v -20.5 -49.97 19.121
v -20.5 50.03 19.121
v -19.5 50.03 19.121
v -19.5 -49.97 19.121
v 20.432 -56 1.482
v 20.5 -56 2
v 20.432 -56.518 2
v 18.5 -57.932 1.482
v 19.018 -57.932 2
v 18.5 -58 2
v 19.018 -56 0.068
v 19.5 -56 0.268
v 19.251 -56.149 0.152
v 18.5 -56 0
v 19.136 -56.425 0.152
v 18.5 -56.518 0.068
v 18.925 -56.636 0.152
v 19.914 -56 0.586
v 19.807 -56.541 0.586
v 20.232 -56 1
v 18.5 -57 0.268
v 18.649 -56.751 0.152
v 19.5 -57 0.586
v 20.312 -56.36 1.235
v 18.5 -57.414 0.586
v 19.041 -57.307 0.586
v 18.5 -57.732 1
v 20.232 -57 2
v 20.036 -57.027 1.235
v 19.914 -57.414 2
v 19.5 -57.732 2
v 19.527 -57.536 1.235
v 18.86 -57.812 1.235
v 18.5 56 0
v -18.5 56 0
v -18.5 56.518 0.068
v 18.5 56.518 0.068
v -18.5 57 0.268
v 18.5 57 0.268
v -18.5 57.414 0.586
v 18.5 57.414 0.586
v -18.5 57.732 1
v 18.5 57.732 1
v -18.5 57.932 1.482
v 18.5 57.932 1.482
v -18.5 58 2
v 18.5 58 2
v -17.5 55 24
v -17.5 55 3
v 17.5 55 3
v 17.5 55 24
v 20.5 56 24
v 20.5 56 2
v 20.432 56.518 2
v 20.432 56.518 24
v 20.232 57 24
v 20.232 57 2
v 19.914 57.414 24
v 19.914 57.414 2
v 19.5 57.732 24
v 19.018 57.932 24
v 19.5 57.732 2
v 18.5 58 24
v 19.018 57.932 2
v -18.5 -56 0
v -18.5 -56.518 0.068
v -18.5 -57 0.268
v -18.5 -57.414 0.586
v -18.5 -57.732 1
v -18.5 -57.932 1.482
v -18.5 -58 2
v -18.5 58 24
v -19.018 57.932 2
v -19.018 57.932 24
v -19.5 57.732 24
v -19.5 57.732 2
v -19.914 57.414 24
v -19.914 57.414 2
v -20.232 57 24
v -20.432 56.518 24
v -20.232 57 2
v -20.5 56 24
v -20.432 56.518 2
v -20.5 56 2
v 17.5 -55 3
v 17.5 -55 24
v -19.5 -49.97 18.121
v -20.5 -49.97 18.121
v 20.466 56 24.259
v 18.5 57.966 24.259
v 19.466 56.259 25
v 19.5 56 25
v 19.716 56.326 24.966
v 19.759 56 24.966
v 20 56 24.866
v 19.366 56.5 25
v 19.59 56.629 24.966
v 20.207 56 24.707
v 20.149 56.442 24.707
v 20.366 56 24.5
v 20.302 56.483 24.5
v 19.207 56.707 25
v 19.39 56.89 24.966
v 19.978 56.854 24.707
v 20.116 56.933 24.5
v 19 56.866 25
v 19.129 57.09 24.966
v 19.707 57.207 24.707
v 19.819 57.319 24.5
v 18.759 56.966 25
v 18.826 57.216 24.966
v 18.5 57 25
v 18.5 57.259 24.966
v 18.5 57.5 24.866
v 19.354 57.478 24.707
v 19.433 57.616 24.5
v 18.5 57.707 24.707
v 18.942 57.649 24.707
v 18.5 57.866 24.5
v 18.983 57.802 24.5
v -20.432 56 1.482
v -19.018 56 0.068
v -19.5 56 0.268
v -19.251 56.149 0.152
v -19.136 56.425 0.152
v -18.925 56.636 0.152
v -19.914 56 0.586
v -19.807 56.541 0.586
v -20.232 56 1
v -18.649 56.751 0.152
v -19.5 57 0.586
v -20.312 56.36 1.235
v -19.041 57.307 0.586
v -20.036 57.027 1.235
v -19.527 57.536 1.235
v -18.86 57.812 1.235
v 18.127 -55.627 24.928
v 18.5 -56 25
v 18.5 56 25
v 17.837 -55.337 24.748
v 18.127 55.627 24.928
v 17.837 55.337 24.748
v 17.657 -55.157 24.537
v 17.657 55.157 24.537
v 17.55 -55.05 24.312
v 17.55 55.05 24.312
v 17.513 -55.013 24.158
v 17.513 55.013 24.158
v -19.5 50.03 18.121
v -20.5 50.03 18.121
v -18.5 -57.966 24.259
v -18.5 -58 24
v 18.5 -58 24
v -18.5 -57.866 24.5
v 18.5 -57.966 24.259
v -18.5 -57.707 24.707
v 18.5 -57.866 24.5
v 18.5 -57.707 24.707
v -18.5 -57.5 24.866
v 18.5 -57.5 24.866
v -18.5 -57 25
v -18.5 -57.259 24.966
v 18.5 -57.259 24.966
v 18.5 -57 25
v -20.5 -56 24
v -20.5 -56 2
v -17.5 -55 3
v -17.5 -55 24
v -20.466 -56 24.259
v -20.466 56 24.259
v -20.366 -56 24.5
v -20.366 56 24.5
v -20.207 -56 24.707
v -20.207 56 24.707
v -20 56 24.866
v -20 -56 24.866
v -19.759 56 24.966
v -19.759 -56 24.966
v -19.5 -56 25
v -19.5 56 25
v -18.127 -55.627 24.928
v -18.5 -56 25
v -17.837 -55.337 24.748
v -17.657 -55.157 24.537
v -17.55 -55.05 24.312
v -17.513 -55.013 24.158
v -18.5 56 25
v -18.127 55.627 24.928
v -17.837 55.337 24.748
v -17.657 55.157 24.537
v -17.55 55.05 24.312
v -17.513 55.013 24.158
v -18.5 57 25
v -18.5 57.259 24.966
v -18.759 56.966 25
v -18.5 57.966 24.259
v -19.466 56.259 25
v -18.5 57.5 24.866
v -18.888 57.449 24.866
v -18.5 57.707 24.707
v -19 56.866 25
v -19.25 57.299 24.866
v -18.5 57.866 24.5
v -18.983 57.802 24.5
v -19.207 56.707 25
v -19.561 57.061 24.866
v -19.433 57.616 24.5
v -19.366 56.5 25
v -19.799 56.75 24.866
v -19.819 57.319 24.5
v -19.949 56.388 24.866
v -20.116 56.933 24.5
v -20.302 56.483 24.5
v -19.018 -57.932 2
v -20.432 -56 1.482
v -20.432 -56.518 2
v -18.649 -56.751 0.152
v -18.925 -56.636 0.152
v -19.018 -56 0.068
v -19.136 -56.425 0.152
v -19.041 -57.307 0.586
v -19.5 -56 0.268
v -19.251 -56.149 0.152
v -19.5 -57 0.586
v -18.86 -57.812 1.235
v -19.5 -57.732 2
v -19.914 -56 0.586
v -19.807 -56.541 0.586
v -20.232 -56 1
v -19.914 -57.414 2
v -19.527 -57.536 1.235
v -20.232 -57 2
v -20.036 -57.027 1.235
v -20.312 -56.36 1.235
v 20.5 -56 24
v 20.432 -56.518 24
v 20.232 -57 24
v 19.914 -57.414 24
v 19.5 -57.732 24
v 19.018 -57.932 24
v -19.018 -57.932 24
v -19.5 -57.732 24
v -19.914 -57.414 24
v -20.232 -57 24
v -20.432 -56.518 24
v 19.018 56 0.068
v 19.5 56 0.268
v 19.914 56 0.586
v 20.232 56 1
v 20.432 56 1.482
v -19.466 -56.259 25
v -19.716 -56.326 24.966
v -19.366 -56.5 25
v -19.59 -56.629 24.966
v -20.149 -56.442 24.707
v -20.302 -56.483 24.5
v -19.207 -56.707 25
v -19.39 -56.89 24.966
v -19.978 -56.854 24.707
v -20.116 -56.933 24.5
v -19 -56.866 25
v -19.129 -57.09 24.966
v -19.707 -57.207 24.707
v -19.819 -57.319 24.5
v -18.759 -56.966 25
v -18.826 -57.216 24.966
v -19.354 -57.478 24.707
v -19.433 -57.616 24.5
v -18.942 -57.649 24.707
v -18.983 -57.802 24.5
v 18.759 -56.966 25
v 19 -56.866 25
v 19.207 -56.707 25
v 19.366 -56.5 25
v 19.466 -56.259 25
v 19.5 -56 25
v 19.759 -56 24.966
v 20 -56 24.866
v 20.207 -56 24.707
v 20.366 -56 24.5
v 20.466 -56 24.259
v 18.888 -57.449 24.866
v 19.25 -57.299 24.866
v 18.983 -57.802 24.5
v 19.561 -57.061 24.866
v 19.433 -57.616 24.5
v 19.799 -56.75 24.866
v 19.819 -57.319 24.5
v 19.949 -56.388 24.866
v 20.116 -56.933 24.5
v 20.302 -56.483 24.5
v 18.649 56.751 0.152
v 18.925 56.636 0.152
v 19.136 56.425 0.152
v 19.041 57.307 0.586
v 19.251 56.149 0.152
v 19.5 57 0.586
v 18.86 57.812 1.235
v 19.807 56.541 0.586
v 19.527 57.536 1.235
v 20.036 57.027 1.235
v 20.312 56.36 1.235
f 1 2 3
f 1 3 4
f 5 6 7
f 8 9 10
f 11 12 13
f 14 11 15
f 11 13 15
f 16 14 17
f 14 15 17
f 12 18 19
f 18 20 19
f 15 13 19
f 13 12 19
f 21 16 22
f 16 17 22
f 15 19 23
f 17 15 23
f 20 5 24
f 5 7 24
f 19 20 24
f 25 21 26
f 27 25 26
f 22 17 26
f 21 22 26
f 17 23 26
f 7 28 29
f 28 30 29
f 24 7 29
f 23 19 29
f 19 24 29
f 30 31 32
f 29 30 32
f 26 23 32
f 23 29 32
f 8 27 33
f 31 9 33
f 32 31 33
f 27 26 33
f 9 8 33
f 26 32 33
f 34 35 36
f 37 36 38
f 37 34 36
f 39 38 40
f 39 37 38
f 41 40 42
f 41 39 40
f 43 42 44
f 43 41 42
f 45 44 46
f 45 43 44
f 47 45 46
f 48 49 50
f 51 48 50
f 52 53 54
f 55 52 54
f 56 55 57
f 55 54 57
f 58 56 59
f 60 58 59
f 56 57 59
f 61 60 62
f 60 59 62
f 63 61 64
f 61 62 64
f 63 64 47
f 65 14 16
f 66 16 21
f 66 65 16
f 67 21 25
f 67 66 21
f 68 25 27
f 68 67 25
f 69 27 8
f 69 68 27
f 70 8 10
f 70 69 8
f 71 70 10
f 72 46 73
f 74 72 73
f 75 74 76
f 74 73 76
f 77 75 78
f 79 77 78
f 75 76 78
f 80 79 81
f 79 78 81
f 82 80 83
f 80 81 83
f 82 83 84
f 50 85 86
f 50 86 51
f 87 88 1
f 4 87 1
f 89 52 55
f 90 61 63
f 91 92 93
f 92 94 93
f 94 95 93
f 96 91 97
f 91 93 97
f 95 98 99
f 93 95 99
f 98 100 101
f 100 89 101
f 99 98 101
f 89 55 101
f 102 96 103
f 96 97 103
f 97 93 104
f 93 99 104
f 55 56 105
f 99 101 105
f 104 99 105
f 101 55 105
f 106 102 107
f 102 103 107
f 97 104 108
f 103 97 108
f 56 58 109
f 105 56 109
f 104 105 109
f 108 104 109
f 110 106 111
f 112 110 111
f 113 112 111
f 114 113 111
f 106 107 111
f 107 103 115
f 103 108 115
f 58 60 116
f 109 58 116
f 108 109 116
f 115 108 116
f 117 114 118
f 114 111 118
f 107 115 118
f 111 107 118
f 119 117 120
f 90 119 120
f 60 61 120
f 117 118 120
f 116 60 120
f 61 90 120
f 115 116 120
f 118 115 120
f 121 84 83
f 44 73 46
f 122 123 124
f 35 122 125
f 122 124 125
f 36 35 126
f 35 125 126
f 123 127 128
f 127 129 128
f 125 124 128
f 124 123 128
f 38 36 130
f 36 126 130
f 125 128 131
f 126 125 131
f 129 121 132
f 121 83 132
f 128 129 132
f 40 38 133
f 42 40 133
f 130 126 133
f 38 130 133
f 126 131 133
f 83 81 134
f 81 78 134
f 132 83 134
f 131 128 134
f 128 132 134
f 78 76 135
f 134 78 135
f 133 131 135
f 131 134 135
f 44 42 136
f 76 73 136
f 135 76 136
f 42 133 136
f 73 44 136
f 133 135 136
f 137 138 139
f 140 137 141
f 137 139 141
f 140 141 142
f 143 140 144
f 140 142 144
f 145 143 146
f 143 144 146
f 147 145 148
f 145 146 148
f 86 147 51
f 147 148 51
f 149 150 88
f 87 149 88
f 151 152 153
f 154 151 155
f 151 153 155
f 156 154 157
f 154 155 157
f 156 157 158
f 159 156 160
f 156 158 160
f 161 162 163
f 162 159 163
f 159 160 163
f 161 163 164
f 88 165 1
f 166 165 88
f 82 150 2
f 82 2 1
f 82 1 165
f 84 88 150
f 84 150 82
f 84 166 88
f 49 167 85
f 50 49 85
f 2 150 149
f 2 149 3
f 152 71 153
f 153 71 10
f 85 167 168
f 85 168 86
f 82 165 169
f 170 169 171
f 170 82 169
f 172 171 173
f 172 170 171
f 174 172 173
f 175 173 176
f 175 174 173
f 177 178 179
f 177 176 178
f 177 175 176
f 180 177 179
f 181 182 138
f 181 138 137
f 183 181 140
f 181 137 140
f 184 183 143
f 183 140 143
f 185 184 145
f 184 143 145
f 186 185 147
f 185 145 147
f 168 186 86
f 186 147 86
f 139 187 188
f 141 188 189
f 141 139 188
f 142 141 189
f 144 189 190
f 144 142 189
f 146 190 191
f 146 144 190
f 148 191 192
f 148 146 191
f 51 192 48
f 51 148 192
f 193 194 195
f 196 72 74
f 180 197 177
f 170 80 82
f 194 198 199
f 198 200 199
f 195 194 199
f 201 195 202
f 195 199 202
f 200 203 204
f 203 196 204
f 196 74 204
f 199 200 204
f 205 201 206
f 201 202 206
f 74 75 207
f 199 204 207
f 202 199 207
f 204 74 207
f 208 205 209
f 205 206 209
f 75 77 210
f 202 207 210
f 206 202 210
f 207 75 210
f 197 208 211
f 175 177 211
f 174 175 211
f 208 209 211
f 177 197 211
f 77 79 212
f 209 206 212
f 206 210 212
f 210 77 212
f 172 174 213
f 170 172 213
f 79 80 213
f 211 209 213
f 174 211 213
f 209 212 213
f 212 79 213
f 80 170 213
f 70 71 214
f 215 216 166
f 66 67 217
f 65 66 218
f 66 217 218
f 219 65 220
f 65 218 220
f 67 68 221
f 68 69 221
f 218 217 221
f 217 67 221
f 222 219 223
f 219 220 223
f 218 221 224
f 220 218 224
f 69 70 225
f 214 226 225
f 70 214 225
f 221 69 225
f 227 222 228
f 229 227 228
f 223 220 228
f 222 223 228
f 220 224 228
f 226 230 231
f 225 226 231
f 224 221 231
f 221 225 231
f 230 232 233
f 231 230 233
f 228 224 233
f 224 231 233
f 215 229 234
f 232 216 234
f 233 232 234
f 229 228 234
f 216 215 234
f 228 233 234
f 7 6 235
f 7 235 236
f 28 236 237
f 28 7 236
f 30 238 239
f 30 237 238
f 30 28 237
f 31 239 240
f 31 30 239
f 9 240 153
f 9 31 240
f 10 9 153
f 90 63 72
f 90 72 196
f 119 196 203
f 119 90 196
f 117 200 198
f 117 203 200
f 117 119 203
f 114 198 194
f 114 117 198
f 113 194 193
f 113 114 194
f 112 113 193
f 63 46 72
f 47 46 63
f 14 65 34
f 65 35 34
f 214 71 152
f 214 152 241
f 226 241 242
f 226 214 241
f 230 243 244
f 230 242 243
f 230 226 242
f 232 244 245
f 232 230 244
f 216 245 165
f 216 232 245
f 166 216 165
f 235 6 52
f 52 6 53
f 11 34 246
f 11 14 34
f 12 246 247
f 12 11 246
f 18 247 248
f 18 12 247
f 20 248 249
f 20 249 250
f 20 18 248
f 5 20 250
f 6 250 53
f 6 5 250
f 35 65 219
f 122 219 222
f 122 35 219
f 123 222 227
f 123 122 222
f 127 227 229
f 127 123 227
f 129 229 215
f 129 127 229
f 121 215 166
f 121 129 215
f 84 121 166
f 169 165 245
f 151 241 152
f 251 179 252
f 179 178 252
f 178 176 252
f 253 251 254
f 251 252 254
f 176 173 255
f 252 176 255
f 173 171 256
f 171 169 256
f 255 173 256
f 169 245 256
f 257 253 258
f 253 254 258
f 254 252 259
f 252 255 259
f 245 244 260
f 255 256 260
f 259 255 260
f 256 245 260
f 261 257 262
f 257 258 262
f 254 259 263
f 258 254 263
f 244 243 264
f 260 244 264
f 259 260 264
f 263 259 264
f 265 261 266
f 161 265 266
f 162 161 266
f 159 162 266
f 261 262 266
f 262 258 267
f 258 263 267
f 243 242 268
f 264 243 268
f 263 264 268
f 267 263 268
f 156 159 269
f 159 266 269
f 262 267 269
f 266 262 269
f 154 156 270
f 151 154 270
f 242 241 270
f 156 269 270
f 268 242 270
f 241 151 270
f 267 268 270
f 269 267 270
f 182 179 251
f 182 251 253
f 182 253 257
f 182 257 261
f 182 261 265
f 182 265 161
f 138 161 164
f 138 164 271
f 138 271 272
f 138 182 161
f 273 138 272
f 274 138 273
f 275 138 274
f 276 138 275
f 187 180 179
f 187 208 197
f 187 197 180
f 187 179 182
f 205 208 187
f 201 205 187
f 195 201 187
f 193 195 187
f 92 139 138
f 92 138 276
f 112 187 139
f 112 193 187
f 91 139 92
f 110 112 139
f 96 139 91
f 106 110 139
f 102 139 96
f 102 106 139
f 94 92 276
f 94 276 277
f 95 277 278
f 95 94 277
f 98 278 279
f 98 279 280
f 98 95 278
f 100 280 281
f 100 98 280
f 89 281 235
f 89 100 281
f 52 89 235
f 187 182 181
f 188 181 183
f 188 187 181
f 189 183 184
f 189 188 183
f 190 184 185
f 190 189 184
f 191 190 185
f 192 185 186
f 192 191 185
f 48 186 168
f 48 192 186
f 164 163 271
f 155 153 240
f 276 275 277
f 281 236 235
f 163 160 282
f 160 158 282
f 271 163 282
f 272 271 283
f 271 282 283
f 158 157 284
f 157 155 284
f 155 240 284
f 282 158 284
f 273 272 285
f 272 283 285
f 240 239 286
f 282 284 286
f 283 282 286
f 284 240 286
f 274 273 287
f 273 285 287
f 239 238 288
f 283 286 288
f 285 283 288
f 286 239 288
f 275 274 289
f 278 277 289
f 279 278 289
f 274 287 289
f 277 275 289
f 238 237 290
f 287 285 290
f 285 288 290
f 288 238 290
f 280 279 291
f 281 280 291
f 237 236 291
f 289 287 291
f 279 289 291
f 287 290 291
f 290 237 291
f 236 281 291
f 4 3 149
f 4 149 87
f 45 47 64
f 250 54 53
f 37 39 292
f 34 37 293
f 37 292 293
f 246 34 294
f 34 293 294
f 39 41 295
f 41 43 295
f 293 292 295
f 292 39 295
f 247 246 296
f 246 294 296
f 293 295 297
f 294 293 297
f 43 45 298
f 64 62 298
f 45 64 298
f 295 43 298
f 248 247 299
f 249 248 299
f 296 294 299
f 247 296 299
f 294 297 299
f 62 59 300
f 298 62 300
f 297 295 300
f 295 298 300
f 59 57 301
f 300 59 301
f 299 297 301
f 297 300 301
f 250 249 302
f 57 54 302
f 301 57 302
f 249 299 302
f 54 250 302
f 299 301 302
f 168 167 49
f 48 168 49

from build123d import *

# Parameters (mm, degrees)
F0_W         = 35
F0_H         = 110
F1_DEPTH     = 3
F2_W         = 41
F2_H         = 116
F2_W_2       = 35
F2_H_2       = 110
F3_DEPTH     = 25
F4_R         = 1
F5_T1_DEPTH  = 30
F5_T4_ANGLE  = 90
F5_T6_ANGLE  = 90
F5_T8_ANGLE  = 90
F5_T10_ANGLE = 90
F7_W         = 100
F7_H         = 1
F8_DEPTH     = 1
F9_R         = 2


# Not quite as in the source:
# - a fillet or chamfer that OpenCascade refuses, or shapes differently, is made with other operations: its cross-section is extruded or revolved along the edge and cut away or added


with BuildPart() as f1:
    # F0 (on Top) → F1 (new body)
    with BuildSketch(Plane.XY):
        Rectangle(F0_W, F0_H)
    extrude(amount=F1_DEPTH)

    # F2 (on Top) → F3 (join)
    with BuildSketch(Plane.XY):
        Rectangle(F2_W, F2_H)
        Rectangle(F2_W_2, F2_H_2, mode=Mode.SUBTRACT)
    extrude(amount=F3_DEPTH)

    # F4
    f4_edges = [f1.edges().sort_by_distance(p)[0] for p in [
        (20.5, 0, 25),
        (0, 58, 25),
        (-20.5, 0, 25),
        (0, -58, 25),
        (-17.5, 0, 25),
        (0, 55, 25),
        (17.5, 0, 25),
        (0, -55, 25),
    ]]
    fillet(f4_edges, radius=F4_R)

    # F5: fillet of radius 2 on 4 edges, made by hand

    # F5_s2 → F5_t1 (cut)
    with BuildSketch(Plane.XY.offset(-5)):
        with BuildLine():
            ThreePointArc((20.5, -56), (19.9142135624, -57.4142135624), (18.5, -58))
            Line((18.5, -58), (20.5, -58))
            Line((20.5, -58), (20.5, -56))
        make_face()
        with BuildLine():
            ThreePointArc((-18.5, -58), (-19.9142135624, -57.4142135624), (-20.5, -56))
            Line((-20.5, -56), (-20.5, -58))
            Line((-20.5, -58), (-18.5, -58))
        make_face()
        with BuildLine():
            ThreePointArc((-18.5, 58), (-19.9142135624, 57.4142135624), (-20.5, 56))
            Line((-20.5, 56), (-20.5, 58))
            Line((-20.5, 58), (-18.5, 58))
        make_face()
        with BuildLine():
            ThreePointArc((20.5, 56), (19.9142135624, 57.4142135624), (18.5, 58))
            Line((18.5, 58), (20.5, 58))
            Line((20.5, 58), (20.5, 56))
        make_face()
    extrude(amount=F5_T1_DEPTH, mode=Mode.SUBTRACT)

    # F5_s3 → F5_t4 (revolve, cut)
    with BuildSketch(Plane.XZ.offset(-56)):
        with BuildLine():
            ThreePointArc((19.5, 25), (20.2071067812, 24.7071067812), (20.5, 24))
            Line((20.5, 24), (20.5, 25))
            Line((20.5, 25), (19.5, 25))
        make_face()
    revolve(axis=Axis((18.5, 56, 25), (0, 0, 1)), revolution_arc=F5_T4_ANGLE, mode=Mode.SUBTRACT)

    # F5_s5 → F5_t6 (revolve, cut)
    with BuildSketch(Plane.YZ.offset(-18.5)):
        with BuildLine():
            ThreePointArc((57, 25), (57.7071067812, 24.7071067812), (58, 24))
            Line((58, 24), (58, 25))
            Line((58, 25), (57, 25))
        make_face()
    revolve(axis=Axis((-18.5, 56, 25), (0, 0, 1)), revolution_arc=F5_T6_ANGLE, mode=Mode.SUBTRACT)

    # F5_s7 → F5_t8 (revolve, cut)
    with BuildSketch(Plane.XZ.offset(56)):
        with BuildLine():
            ThreePointArc((-19.5, 25), (-20.2071067812, 24.7071067812), (-20.5, 24))
            Line((-20.5, 24), (-20.5, 25))
            Line((-20.5, 25), (-19.5, 25))
        make_face()
    revolve(axis=Axis((-18.5, -56, 25), (0, 0, 1)), revolution_arc=F5_T8_ANGLE, mode=Mode.SUBTRACT)

    # F5_s9 → F5_t10 (revolve, cut)
    with BuildSketch(Plane.YZ.offset(18.5)):
        with BuildLine():
            ThreePointArc((-57, 25), (-57.7071067812, 24.7071067812), (-58, 24))
            Line((-58, 24), (-58, 25))
            Line((-58, 25), (-57, 25))
        make_face()
    revolve(axis=Axis((18.5, -56, 25), (0, 0, 1)), revolution_arc=F5_T10_ANGLE, mode=Mode.SUBTRACT)

    # F7 (on face) → F8 (cut)
    with BuildSketch(Plane(origin=(-20.5, 0, 0), x_dir=(0, -1, 0), z_dir=(-1, 0, 0))):
        with Locations((-0.0301606953, 18.6210061312)):
            Rectangle(F7_W, F7_H)
    extrude(amount=-F8_DEPTH, mode=Mode.SUBTRACT)

    # F9
    f9_edges = [f1.edges().sort_by_distance(p)[0] for p in [
        (19.914214, -57.414214, 0),
        (0, -58, 0),
        (-19.914214, -57.414214, 0),
        (-20.5, 0, 0),
        (-19.914214, 57.414214, 0),
        (0, 58, 0),
        (19.914214, 57.414214, 0),
        (20.5, 0, 0),
    ]]
    fillet(f9_edges, radius=F9_R)


solid = f1.part
